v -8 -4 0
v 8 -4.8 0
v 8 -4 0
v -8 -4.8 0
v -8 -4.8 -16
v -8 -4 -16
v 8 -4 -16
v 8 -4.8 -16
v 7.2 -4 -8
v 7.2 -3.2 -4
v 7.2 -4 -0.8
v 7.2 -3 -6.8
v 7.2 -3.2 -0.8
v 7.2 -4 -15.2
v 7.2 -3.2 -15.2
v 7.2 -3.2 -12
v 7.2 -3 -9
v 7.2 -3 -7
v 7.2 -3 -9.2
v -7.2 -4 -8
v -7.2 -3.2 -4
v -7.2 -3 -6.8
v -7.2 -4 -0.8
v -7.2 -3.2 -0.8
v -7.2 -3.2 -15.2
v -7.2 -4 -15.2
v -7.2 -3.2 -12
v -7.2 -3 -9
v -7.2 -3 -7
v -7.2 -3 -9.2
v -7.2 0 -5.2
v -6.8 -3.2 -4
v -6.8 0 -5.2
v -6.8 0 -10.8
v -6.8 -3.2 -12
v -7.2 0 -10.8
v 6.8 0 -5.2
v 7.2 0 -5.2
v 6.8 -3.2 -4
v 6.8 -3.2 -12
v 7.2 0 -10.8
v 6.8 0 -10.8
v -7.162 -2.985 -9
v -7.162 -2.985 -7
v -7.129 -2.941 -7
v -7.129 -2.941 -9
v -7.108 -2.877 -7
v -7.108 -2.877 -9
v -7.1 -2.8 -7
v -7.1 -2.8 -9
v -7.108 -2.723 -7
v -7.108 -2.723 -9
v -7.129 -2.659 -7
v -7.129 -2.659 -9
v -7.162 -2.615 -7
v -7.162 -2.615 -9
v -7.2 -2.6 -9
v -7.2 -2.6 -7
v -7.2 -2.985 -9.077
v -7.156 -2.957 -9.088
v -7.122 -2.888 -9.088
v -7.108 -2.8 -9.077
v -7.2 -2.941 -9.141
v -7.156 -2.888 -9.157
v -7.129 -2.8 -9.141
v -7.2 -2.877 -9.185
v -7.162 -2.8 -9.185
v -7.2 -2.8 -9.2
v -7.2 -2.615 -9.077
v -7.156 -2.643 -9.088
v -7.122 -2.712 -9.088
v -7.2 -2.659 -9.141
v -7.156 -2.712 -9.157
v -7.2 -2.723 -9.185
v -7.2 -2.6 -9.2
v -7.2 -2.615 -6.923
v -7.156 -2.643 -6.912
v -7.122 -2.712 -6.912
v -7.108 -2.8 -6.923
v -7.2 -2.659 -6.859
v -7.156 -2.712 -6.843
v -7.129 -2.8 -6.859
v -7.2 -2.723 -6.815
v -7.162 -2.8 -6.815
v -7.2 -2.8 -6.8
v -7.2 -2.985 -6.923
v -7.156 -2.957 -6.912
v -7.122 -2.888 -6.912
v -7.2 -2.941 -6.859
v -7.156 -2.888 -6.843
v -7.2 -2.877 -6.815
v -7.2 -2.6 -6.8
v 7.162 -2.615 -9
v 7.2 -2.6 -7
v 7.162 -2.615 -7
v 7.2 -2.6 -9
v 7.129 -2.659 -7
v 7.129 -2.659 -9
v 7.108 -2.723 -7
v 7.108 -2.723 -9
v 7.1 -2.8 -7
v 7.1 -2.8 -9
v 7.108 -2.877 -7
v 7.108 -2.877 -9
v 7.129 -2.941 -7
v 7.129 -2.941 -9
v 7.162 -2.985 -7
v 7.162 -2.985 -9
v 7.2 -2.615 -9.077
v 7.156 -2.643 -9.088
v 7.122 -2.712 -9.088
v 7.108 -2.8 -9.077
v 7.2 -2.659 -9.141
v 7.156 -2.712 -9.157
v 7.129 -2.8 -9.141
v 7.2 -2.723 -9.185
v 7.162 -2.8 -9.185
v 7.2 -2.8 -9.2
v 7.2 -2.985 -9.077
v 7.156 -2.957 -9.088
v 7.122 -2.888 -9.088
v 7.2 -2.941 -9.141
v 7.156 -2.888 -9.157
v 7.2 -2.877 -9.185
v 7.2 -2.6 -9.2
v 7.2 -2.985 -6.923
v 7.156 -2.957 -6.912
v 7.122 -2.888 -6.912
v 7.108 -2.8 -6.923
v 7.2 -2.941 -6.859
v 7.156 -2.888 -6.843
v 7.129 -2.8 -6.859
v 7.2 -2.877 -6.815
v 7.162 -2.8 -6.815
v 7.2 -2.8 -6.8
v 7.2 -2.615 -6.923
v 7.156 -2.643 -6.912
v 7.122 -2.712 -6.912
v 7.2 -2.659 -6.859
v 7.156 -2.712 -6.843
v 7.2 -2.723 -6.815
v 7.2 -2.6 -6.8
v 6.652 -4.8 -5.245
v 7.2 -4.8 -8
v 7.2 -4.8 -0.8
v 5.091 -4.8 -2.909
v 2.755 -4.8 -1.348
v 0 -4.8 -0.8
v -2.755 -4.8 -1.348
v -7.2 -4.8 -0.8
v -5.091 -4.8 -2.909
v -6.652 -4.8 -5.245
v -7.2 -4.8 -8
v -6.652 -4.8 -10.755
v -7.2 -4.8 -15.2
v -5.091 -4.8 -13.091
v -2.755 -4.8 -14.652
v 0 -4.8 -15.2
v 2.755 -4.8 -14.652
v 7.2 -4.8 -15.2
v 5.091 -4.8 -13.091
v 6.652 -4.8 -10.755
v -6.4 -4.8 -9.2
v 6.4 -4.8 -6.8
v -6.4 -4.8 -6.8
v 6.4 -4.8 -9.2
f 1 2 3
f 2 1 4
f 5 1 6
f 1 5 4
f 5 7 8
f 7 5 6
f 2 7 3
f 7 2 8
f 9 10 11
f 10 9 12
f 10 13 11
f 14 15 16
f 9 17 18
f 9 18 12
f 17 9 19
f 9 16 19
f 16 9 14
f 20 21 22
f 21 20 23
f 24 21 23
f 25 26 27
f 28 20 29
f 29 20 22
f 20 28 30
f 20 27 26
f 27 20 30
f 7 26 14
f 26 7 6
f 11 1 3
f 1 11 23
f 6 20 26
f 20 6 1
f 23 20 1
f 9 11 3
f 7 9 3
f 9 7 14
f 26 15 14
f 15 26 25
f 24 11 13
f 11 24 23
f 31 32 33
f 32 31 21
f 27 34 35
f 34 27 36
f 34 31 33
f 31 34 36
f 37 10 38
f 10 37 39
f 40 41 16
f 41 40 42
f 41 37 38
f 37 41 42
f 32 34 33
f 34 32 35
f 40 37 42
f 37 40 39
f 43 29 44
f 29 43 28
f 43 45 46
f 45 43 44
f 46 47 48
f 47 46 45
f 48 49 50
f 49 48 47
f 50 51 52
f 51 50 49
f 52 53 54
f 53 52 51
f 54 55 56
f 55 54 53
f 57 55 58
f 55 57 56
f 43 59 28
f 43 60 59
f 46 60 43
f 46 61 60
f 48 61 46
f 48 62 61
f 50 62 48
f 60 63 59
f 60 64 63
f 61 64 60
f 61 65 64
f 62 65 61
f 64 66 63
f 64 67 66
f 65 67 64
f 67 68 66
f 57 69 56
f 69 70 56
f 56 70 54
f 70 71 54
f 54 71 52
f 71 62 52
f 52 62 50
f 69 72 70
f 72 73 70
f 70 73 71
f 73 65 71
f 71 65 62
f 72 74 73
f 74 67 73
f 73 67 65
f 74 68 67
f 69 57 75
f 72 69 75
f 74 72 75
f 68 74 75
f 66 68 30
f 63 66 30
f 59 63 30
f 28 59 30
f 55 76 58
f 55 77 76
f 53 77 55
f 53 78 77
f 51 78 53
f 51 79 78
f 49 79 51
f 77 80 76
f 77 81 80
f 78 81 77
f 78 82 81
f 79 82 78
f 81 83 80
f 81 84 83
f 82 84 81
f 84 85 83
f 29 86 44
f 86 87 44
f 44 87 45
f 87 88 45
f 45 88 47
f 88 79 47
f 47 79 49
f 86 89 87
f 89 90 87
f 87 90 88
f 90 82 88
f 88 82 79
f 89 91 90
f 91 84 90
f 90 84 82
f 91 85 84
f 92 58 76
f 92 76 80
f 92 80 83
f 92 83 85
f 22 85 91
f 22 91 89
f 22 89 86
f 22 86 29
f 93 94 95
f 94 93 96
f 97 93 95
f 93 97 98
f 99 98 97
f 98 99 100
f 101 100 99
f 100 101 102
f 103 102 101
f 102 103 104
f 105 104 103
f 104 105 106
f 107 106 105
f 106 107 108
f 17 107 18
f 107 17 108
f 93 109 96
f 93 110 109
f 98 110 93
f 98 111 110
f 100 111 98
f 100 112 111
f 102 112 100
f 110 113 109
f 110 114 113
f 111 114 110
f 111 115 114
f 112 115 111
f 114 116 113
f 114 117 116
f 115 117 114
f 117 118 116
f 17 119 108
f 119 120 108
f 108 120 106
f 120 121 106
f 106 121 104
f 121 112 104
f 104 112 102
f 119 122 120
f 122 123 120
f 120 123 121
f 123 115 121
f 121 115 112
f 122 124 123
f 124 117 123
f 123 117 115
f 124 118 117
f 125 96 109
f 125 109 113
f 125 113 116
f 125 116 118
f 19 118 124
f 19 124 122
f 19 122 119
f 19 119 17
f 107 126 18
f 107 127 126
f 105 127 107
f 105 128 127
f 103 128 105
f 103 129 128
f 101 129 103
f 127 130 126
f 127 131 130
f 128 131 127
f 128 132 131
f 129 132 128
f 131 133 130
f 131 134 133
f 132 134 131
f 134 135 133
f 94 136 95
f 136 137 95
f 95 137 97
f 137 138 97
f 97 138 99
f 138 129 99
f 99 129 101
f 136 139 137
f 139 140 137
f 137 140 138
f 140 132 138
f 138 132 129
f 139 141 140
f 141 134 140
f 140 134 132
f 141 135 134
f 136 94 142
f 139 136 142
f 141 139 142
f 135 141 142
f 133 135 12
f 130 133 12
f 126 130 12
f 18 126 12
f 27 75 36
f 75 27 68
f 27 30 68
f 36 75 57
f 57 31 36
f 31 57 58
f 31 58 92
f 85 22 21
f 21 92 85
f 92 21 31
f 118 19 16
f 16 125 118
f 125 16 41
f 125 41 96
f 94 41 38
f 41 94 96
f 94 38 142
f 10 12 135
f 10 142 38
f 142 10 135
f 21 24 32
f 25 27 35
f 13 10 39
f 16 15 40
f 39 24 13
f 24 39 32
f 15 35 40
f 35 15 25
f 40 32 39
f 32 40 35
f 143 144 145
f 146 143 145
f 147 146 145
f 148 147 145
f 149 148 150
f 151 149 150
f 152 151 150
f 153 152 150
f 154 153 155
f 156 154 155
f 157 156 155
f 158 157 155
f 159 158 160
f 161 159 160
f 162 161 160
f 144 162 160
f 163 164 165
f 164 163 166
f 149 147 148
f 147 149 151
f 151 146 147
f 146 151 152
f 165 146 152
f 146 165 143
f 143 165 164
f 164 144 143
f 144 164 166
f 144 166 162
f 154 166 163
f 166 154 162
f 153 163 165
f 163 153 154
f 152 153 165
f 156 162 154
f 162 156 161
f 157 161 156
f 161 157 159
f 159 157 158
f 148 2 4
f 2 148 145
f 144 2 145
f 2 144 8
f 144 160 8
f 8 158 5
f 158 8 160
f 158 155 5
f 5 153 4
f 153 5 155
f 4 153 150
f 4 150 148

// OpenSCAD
// file: ../p/1-8sphe.scad
use <../lib.scad>
function ldraw_lib__1_8sphe() = [
// 0 Sphere 0.125
// 0 Name: 1-8sphe.dat
// 0 Author: James Jessiman
// 0 !LDRAW_ORG Primitive UPDATE 2012-03
// 0 !LICENSE Licensed under CC BY 4.0 : see CAreadme.txt
// 
// 0 BFC CERTIFY CCW
  [0,"BFC","CERTIFY"],
  [0,"BFC","CCW"],
// 
// 0 !HISTORY 2000-08-01 {Axel Poque} fixes to resolve L3P error messages.
// 0 !HISTORY 2000-08-01 {Manfred Moolhuysen} fixes to resolve L3P error messages.
// 0 !HISTORY 2000-09-30 [PTadmin] Official Update 2000-02
// 0 !HISTORY 2002-03-28 [hafhead] Made BFC compliant
// 0 !HISTORY 2002-04-25 [PTadmin] Official Update 2002-02
// 0 !HISTORY 2007-06-22 [PTadmin] Header formatted for Contributor Agreement
// 0 !HISTORY 2008-07-01 [PTadmin] Official Update 2008-01
// 0 !HISTORY 2010-09-12 [MagFors] Changed winding, removed duplicated cond-line, optimized filesize
// 0 !HISTORY 2010-12-31 [PTadmin] Official Update 2010-03
// 0 !HISTORY 2012-07-01 [tcobbs] Replaced with geometry from LDView
// 0 !HISTORY 2012-12-28 [PTadmin] Official Update 2012-03
// 
// 
// 3 16 1 0 0 0.9239 0.3827 0 0.9239 0 0.3827
  [3,16,1,0,0,0.9239,0.3827,0,0.9239,0,0.3827],
// 3 16 0.9239 0.3827 0 0.7836 0.4393 0.4393 0.9239 0 0.3827
  [3,16,0.9239,0.3827,0,0.7836,0.4393,0.4393,0.9239,0,0.3827],
// 3 16 0.9239 0 0.3827 0.7836 0.4393 0.4393 0.7071 0 0.7071
  [3,16,0.9239,0,0.3827,0.7836,0.4393,0.4393,0.7071,0,0.7071],
// 3 16 0.7836 0.4393 0.4393 0.4393 0.4393 0.7836 0.7071 0 0.7071
  [3,16,0.7836,0.4393,0.4393,0.4393,0.4393,0.7836,0.7071,0,0.7071],
// 3 16 0.7071 0 0.7071 0.4393 0.4393 0.7836 0.3827 0 0.9239
  [3,16,0.7071,0,0.7071,0.4393,0.4393,0.7836,0.3827,0,0.9239],
// 3 16 0.4393 0.4393 0.7836 0 0.3827 0.9239 0.3827 0 0.9239
  [3,16,0.4393,0.4393,0.7836,0,0.3827,0.9239,0.3827,0,0.9239],
// 3 16 0.3827 0 0.9239 0 0.3827 0.9239 0 0 1
  [3,16,0.3827,0,0.9239,0,0.3827,0.9239,0,0,1],
// 3 16 0.9239 0.3827 0 0.7071 0.7071 0 0.7836 0.4393 0.4393
  [3,16,0.9239,0.3827,0,0.7071,0.7071,0,0.7836,0.4393,0.4393],
// 3 16 0.7071 0.7071 0 0.4393 0.7836 0.4393 0.7836 0.4393 0.4393
  [3,16,0.7071,0.7071,0,0.4393,0.7836,0.4393,0.7836,0.4393,0.4393],
// 3 16 0.7836 0.4393 0.4393 0.4393 0.7836 0.4393 0.4393 0.4393 0.7836
  [3,16,0.7836,0.4393,0.4393,0.4393,0.7836,0.4393,0.4393,0.4393,0.7836],
// 3 16 0.4393 0.7836 0.4393 0 0.7071 0.7071 0.4393 0.4393 0.7836
  [3,16,0.4393,0.7836,0.4393,0,0.7071,0.7071,0.4393,0.4393,0.7836],
// 3 16 0.4393 0.4393 0.7836 0 0.7071 0.7071 0 0.3827 0.9239
  [3,16,0.4393,0.4393,0.7836,0,0.7071,0.7071,0,0.3827,0.9239],
// 3 16 0.7071 0.7071 0 0.3827 0.9239 0 0.4393 0.7836 0.4393
  [3,16,0.7071,0.7071,0,0.3827,0.9239,0,0.4393,0.7836,0.4393],
// 3 16 0.3827 0.9239 0 0 0.9239 0.3827 0.4393 0.7836 0.4393
  [3,16,0.3827,0.9239,0,0,0.9239,0.3827,0.4393,0.7836,0.4393],
// 3 16 0.4393 0.7836 0.4393 0 0.9239 0.3827 0 0.7071 0.7071
  [3,16,0.4393,0.7836,0.4393,0,0.9239,0.3827,0,0.7071,0.7071],
// 3 16 0.3827 0.9239 0 0 1 0 0 0.9239 0.3827
  [3,16,0.3827,0.9239,0,0,1,0,0,0.9239,0.3827],
// 
// 5 24 1 0 0 0.9239 0.3827 0 1 0 -0.1 0.9239 0 0.3827
  [5,24,1,0,0,0.9239,0.3827,0,1,0,-0.1,0.9239,0,0.3827],
// 5 24 0.9239 0.3827 0 0.9239 0 0.3827 1 0 0 0.7836 0.4393 0.4393
  [5,24,0.9239,0.3827,0,0.9239,0,0.3827,1,0,0,0.7836,0.4393,0.4393],
// 5 24 1 0 0 0.9239 0 0.3827 0.9239 0.3827 0 1 -0.1 0
  [5,24,1,0,0,0.9239,0,0.3827,0.9239,0.3827,0,1,-0.1,0],
// 5 24 0.9239 0 0.3827 0.7836 0.4393 0.4393 0.9239 0.3827 0 0.7071 0 0.7071
  [5,24,0.9239,0,0.3827,0.7836,0.4393,0.4393,0.9239,0.3827,0,0.7071,0,0.7071],
// 5 24 0.7836 0.4393 0.4393 0.7071 0 0.7071 0.9239 0 0.3827 0.4393 0.4393 0.7836
  [5,24,0.7836,0.4393,0.4393,0.7071,0,0.7071,0.9239,0,0.3827,0.4393,0.4393,0.7836],
// 5 24 0.9239 0 0.3827 0.7071 0 0.7071 0.7836 0.4393 0.4393 0.9239 -0.1 0.3827
  [5,24,0.9239,0,0.3827,0.7071,0,0.7071,0.7836,0.4393,0.4393,0.9239,-0.1,0.3827],
// 5 24 0.7071 0 0.7071 0.4393 0.4393 0.7836 0.7836 0.4393 0.4393 0.3827 0 0.9239
  [5,24,0.7071,0,0.7071,0.4393,0.4393,0.7836,0.7836,0.4393,0.4393,0.3827,0,0.9239],
// 5 24 0.4393 0.4393 0.7836 0.3827 0 0.9239 0.7071 0 0.7071 0 0.3827 0.9239
  [5,24,0.4393,0.4393,0.7836,0.3827,0,0.9239,0.7071,0,0.7071,0,0.3827,0.9239],
// 5 24 0.7071 0 0.7071 0.3827 0 0.9239 0.4393 0.4393 0.7836 0.7071 -0.1 0.7071
  [5,24,0.7071,0,0.7071,0.3827,0,0.9239,0.4393,0.4393,0.7836,0.7071,-0.1,0.7071],
// 5 24 0.3827 0 0.9239 0 0.3827 0.9239 0.4393 0.4393 0.7836 0 0 1
  [5,24,0.3827,0,0.9239,0,0.3827,0.9239,0.4393,0.4393,0.7836,0,0,1],
// 5 24 0 0.3827 0.9239 0 0 1 0.3827 0 0.9239 -0.1 0.3827 0.9239
  [5,24,0,0.3827,0.9239,0,0,1,0.3827,0,0.9239,-0.1,0.3827,0.9239],
// 5 24 0.3827 0 0.9239 0 0 1 0 0.3827 0.9239 0.3827 -0.1 0.9239
  [5,24,0.3827,0,0.9239,0,0,1,0,0.3827,0.9239,0.3827,-0.1,0.9239],
// 5 24 0.9239 0.3827 0 0.7071 0.7071 0 0.9239 0.3827 -0.1 0.7836 0.4393 0.4393
  [5,24,0.9239,0.3827,0,0.7071,0.7071,0,0.9239,0.3827,-0.1,0.7836,0.4393,0.4393],
// 5 24 0.7071 0.7071 0 0.7836 0.4393 0.4393 0.9239 0.3827 0 0.4393 0.7836 0.4393
  [5,24,0.7071,0.7071,0,0.7836,0.4393,0.4393,0.9239,0.3827,0,0.4393,0.7836,0.4393],
// 5 24 0.9239 0.3827 0 0.7836 0.4393 0.4393 0.7071 0.7071 0 0.9239 0 0.3827
  [5,24,0.9239,0.3827,0,0.7836,0.4393,0.4393,0.7071,0.7071,0,0.9239,0,0.3827],
// 5 24 0.7836 0.4393 0.4393 0.4393 0.7836 0.4393 0.7071 0.7071 0 0.4393 0.4393 0.7836
  [5,24,0.7836,0.4393,0.4393,0.4393,0.7836,0.4393,0.7071,0.7071,0,0.4393,0.4393,0.7836],
// 5 24 0.4393 0.7836 0.4393 0.4393 0.4393 0.7836 0.7836 0.4393 0.4393 0 0.7071 0.7071
  [5,24,0.4393,0.7836,0.4393,0.4393,0.4393,0.7836,0.7836,0.4393,0.4393,0,0.7071,0.7071],
// 5 24 0.7836 0.4393 0.4393 0.4393 0.4393 0.7836 0.4393 0.7836 0.4393 0.7071 0 0.7071
  [5,24,0.7836,0.4393,0.4393,0.4393,0.4393,0.7836,0.4393,0.7836,0.4393,0.7071,0,0.7071],
// 5 24 0.4393 0.4393 0.7836 0 0.7071 0.7071 0.4393 0.7836 0.4393 0 0.3827 0.9239
  [5,24,0.4393,0.4393,0.7836,0,0.7071,0.7071,0.4393,0.7836,0.4393,0,0.3827,0.9239],
// 5 24 0 0.7071 0.7071 0 0.3827 0.9239 0.4393 0.4393 0.7836 -0.1 0.7071 0.7071
  [5,24,0,0.7071,0.7071,0,0.3827,0.9239,0.4393,0.4393,0.7836,-0.1,0.7071,0.7071],
// 5 24 0.4393 0.4393 0.7836 0 0.3827 0.9239 0 0.7071 0.7071 0.3827 0 0.9239
  [5,24,0.4393,0.4393,0.7836,0,0.3827,0.9239,0,0.7071,0.7071,0.3827,0,0.9239],
// 5 24 0.7071 0.7071 0 0.3827 0.9239 0 0.7071 0.7071 -0.1 0.4393 0.7836 0.4393
  [5,24,0.7071,0.7071,0,0.3827,0.9239,0,0.7071,0.7071,-0.1,0.4393,0.7836,0.4393],
// 5 24 0.3827 0.9239 0 0.4393 0.7836 0.4393 0.7071 0.7071 0 0 0.9239 0.3827
  [5,24,0.3827,0.9239,0,0.4393,0.7836,0.4393,0.7071,0.7071,0,0,0.9239,0.3827],
// 5 24 0.7071 0.7071 0 0.4393 0.7836 0.4393 0.3827 0.9239 0 0.7836 0.4393 0.4393
  [5,24,0.7071,0.7071,0,0.4393,0.7836,0.4393,0.3827,0.9239,0,0.7836,0.4393,0.4393],
// 5 24 0.4393 0.7836 0.4393 0 0.9239 0.3827 0.3827 0.9239 0 0 0.7071 0.7071
  [5,24,0.4393,0.7836,0.4393,0,0.9239,0.3827,0.3827,0.9239,0,0,0.7071,0.7071],
// 5 24 0 0.9239 0.3827 0 0.7071 0.7071 0.4393 0.7836 0.4393 -0.1 0.9239 0.3827
  [5,24,0,0.9239,0.3827,0,0.7071,0.7071,0.4393,0.7836,0.4393,-0.1,0.9239,0.3827],
// 5 24 0.4393 0.7836 0.4393 0 0.7071 0.7071 0 0.9239 0.3827 0.4393 0.4393 0.7836
  [5,24,0.4393,0.7836,0.4393,0,0.7071,0.7071,0,0.9239,0.3827,0.4393,0.4393,0.7836],
// 5 24 0.3827 0.9239 0 0 1 0 0.3827 0.9239 -0.1 0 0.9239 0.3827
  [5,24,0.3827,0.9239,0,0,1,0,0.3827,0.9239,-0.1,0,0.9239,0.3827],
// 5 24 0 1 0 0 0.9239 0.3827 0.3827 0.9239 0 -0.1 1 0
  [5,24,0,1,0,0,0.9239,0.3827,0.3827,0.9239,0,-0.1,1,0],
// 5 24 0.3827 0.9239 0 0 0.9239 0.3827 0 1 0 0.4393 0.7836 0.4393
  [5,24,0.3827,0.9239,0,0,0.9239,0.3827,0,1,0,0.4393,0.7836,0.4393],
];
module ldraw_lib__1_8sphe(step=0, col=false, unit=2/5, alt=false, line=0.2, solid=!$preview)
    makepoly(ldraw_lib__1_8sphe(), step=step, col=col, unit=unit, alt=alt, line=line, solid=solid);
ldraw_lib__1_8sphe(line=0.2);
// file: ../p/empty.scad
use <../lib.scad>
function ldraw_lib__empty() = [
// 0 Empty
// 0 Name: empty.dat
// 0 Author: Steffen [Steffen]
// 0 !LDRAW_ORG Primitive UPDATE 2015-01
// 0 !LICENSE Licensed under CC BY 4.0 : see CAreadme.txt
// 
// 0 BFC CERTIFY CCW
  [0,"BFC","CERTIFY"],
  [0,"BFC","CCW"],
// 
// 0 !HISTORY 2015-10-11 [PTadmin] Official Update 2015-01
// 
// 
// 0 // // Tool MLCad cannot handle really empty files. This file is used as a workaround.
// 0 // // It exceptionally contains forbidden non-LDRAW standard syntax to satisfy MLCad until it is fixed OR a different editor has become the de-facto LDRAW standard.
// 0 // // The line being used here is an "impossible" conditional line which never should be visible,
// 0 // // additionally hidden by a syntax explicitly hiding it from displaying.
// 
// 0 // MLCAD HIDE 5 24 0 0 0 0.0001 0 0 0.0001 -0.0001 0 0 0 0
];
module ldraw_lib__empty(step=0, col=false, unit=2/5, alt=false, line=0.2, solid=!$preview)
    makepoly(ldraw_lib__empty(), step=step, col=col, unit=unit, alt=alt, line=line, solid=solid);
ldraw_lib__empty(line=0.2);
// file: ../p/box4.scad
use <../lib.scad>
function ldraw_lib__box4() = [
// 0 Box with 4 Faces (2 Parallel Pairs) and All Edges
// 0 Name: box4.dat
// 0 Author: James Jessiman
// 0 !LDRAW_ORG Primitive UPDATE 2012-01
// 0 !LICENSE Licensed under CC BY 4.0 : see CAreadme.txt
// 
// 0 BFC CERTIFY CCW
  [0,"BFC","CERTIFY"],
  [0,"BFC","CCW"],
// 
// 0 !HISTORY 2002-04-03 [sbliss] Modified for BFC compliance
// 0 !HISTORY 2002-04-25 [PTadmin] Official Update 2002-02
// 0 !HISTORY 2007-06-24 [PTadmin] Header formatted for Contributor Agreement
// 0 !HISTORY 2008-07-01 [PTadmin] Official Update 2008-01
// 0 !HISTORY 2012-02-16 [Philo] Changed to CCW
// 0 !HISTORY 2012-03-30 [PTadmin] Official Update 2012-01
// 
// 
// 2 24 1 1 1 -1 1 1
  [2,24,1,1,1,-1,1,1],
// 2 24 -1 1 1 -1 1 -1
  [2,24,-1,1,1,-1,1,-1],
// 2 24 -1 1 -1 1 1 -1
  [2,24,-1,1,-1,1,1,-1],
// 2 24 1 1 -1 1 1 1
  [2,24,1,1,-1,1,1,1],
// 2 24 1 0 1 -1 0 1
  [2,24,1,0,1,-1,0,1],
// 2 24 -1 0 1 -1 0 -1
  [2,24,-1,0,1,-1,0,-1],
// 2 24 -1 0 -1 1 0 -1
  [2,24,-1,0,-1,1,0,-1],
// 2 24 1 0 -1 1 0 1
  [2,24,1,0,-1,1,0,1],
// 2 24 1 0 1 1 1 1
  [2,24,1,0,1,1,1,1],
// 2 24 -1 0 1 -1 1 1
  [2,24,-1,0,1,-1,1,1],
// 2 24 1 0 -1 1 1 -1
  [2,24,1,0,-1,1,1,-1],
// 2 24 -1 0 -1 -1 1 -1
  [2,24,-1,0,-1,-1,1,-1],
// 4 16 -1 1 1 -1 0 1 1 0 1 1 1 1
  [4,16,-1,1,1,-1,0,1,1,0,1,1,1,1],
// 4 16 -1 1 -1 -1 0 -1 -1 0 1 -1 1 1
  [4,16,-1,1,-1,-1,0,-1,-1,0,1,-1,1,1],
// 4 16 1 1 -1 1 0 -1 -1 0 -1 -1 1 -1
  [4,16,1,1,-1,1,0,-1,-1,0,-1,-1,1,-1],
// 4 16 1 1 1 1 0 1 1 0 -1 1 1 -1
  [4,16,1,1,1,1,0,1,1,0,-1,1,1,-1],
];
module ldraw_lib__box4(step=0, col=false, unit=2/5, alt=false, line=0.2, solid=!$preview)
    makepoly(ldraw_lib__box4(), step=step, col=col, unit=unit, alt=alt, line=line, solid=solid);
ldraw_lib__box4(line=0.2);
// file: ../p/2-8sphe.scad
use <../lib.scad>
use <1-8sphe.scad>
function ldraw_lib__2_8sphe() = [
// 0 Sphere 0.25
// 0 Name: 2-8sphe.dat
// 0 Author: James Jessiman
// 0 !LDRAW_ORG Primitive UPDATE 2003-02
// 0 !LICENSE Licensed under CC BY 4.0 : see CAreadme.txt
// 
// 0 BFC CERTIFY CCW
  [0,"BFC","CERTIFY"],
  [0,"BFC","CCW"],
// 
// 0 !HISTORY 2002-08-31 [izanette] Modified with WINDZ for BFC compliance
// 0 !HISTORY 2003-08-01 [PTadmin] Official Update 2003-02
// 0 !HISTORY 2007-06-24 [PTadmin] Header formatted for Contributor Agreement
// 0 !HISTORY 2008-07-01 [PTadmin] Official Update 2008-01
// 
// 
// 1 16 0 0 0 1 0 0 0 1 0 0 0 1 1-8sphe.dat
  [1,16,0,0,0,1,0,0,0,1,0,0,0,1, ldraw_lib__1_8sphe()],
// 1 16 0 0 0 -1 0 0 0 1 0 0 0 1 1-8sphe.dat
  [1,16,0,0,0,-1,0,0,0,1,0,0,0,1, ldraw_lib__1_8sphe()],
// 0
// 
];
module ldraw_lib__2_8sphe(step=0, col=false, unit=2/5, alt=false, line=0.2, solid=!$preview)
    makepoly(ldraw_lib__2_8sphe(), step=step, col=col, unit=unit, alt=alt, line=line, solid=solid);
ldraw_lib__2_8sphe(line=0.2);
// file: ../p/2-4ndis.scad
use <../lib.scad>
function ldraw_lib__2_4ndis() = [
// 0 Disc Negative 0.5
// 0 Name: 2-4ndis.dat
// 0 Author: James Jessiman
// 0 !LDRAW_ORG Primitive UPDATE 2012-01
// 0 !LICENSE Licensed under CC BY 4.0 : see CAreadme.txt
// 
// 0 BFC CERTIFY CCW
  [0,"BFC","CERTIFY"],
  [0,"BFC","CCW"],
// 
// 0 !HISTORY 2002-03-23 [sbliss] Added BFC statement; compacted code
// 0 !HISTORY 2002-04-25 [PTadmin] Official Update 2002-02
// 0 !HISTORY 2007-06-24 [PTadmin] Header formatted for Contributor Agreement
// 0 !HISTORY 2008-07-01 [PTadmin] Official Update 2008-01
// 0 !HISTORY 2012-02-16 [Philo] Changed to CCW
// 0 !HISTORY 2012-03-30 [PTadmin] Official Update 2012-01
// 
// 
// 3 16 0.9239 0 0.3827 1 0 0 1 0 1
  [3,16,0.9239,0,0.3827,1,0,0,1,0,1],
// 3 16 0.7071 0 0.7071 0.9239 0 0.3827 1 0 1
  [3,16,0.7071,0,0.7071,0.9239,0,0.3827,1,0,1],
// 3 16 0.3827 0 0.9239 0.7071 0 0.7071 1 0 1
  [3,16,0.3827,0,0.9239,0.7071,0,0.7071,1,0,1],
// 3 16 0 0 1 0.3827 0 0.9239 1 0 1
  [3,16,0,0,1,0.3827,0,0.9239,1,0,1],
// 3 16 -0.3827 0 0.9239 0 0 1 -1 0 1
  [3,16,-0.3827,0,0.9239,0,0,1,-1,0,1],
// 3 16 -0.7071 0 0.7071 -0.3827 0 0.9239 -1 0 1
  [3,16,-0.7071,0,0.7071,-0.3827,0,0.9239,-1,0,1],
// 3 16 -0.9239 0 0.3827 -0.7071 0 0.7071 -1 0 1
  [3,16,-0.9239,0,0.3827,-0.7071,0,0.7071,-1,0,1],
// 3 16 -1 0 0 -0.9239 0 0.3827 -1 0 1
  [3,16,-1,0,0,-0.9239,0,0.3827,-1,0,1],
];
module ldraw_lib__2_4ndis(step=0, col=false, unit=2/5, alt=false, line=0.2, solid=!$preview)
    makepoly(ldraw_lib__2_4ndis(), step=step, col=col, unit=unit, alt=alt, line=line, solid=solid);
ldraw_lib__2_4ndis(line=0.2);
// file: ../p/2-4edge.scad
use <../lib.scad>
function ldraw_lib__2_4edge() = [
// 0 Circle 0.5
// 0 Name: 2-4edge.dat
// 0 Author: James Jessiman
// 0 !LDRAW_ORG Primitive UPDATE 2017-01
// 0 !LICENSE Licensed under CC BY 4.0 : see CAreadme.txt
// 
// 0 BFC CERTIFY CCW
  [0,"BFC","CERTIFY"],
  [0,"BFC","CCW"],
// 
// 0 !HISTORY 2007-06-24 [PTadmin] Header formatted for Contributor Agreement
// 0 !HISTORY 2008-07-01 [PTadmin] Official Update 2008-01
// 0 !HISTORY 2017-01-15 [Steffen] BFCed
// 0 !HISTORY 2017-12-30 [PTadmin] Official Update 2017-01
// 
// 
// 2 24 1 0 0 0.9239 0 0.3827
  [2,24,1,0,0,0.9239,0,0.3827],
// 2 24 0.9239 0 0.3827 0.7071 0 0.7071
  [2,24,0.9239,0,0.3827,0.7071,0,0.7071],
// 2 24 0.7071 0 0.7071 0.3827 0 0.9239
  [2,24,0.7071,0,0.7071,0.3827,0,0.9239],
// 2 24 0.3827 0 0.9239 0 0 1
  [2,24,0.3827,0,0.9239,0,0,1],
// 2 24 0 0 1 -0.3827 0 0.9239
  [2,24,0,0,1,-0.3827,0,0.9239],
// 2 24 -0.3827 0 0.9239 -0.7071 0 0.7071
  [2,24,-0.3827,0,0.9239,-0.7071,0,0.7071],
// 2 24 -0.7071 0 0.7071 -0.9239 0 0.3827
  [2,24,-0.7071,0,0.7071,-0.9239,0,0.3827],
// 2 24 -0.9239 0 0.3827 -1 0 0
  [2,24,-0.9239,0,0.3827,-1,0,0],
];
module ldraw_lib__2_4edge(step=0, col=false, unit=2/5, alt=false, line=0.2, solid=!$preview)
    makepoly(ldraw_lib__2_4edge(), step=step, col=col, unit=unit, alt=alt, line=line, solid=solid);
ldraw_lib__2_4edge(line=0.2);
// file: ../p/2-4cyli.scad
use <../lib.scad>
function ldraw_lib__2_4cyli() = [
// 0 Cylinder 0.5
// 0 Name: 2-4cyli.dat
// 0 Author: James Jessiman
// 0 !LDRAW_ORG Primitive UPDATE 2005-01
// 0 !LICENSE Licensed under CC BY 4.0 : see CAreadme.txt
// 
// 0 BFC CERTIFY CCW
  [0,"BFC","CERTIFY"],
  [0,"BFC","CCW"],
// 
// 0 !HISTORY 2002-03-23 [sbliss] Added BFC statement; compacted code
// 0 !HISTORY 2002-04-25 [PTadmin] Official Update 2002-02
// 0 !HISTORY 2004-12-11 [nielsk] Recreated using Primitive Generator, Edge lines fixed, BFC changed to CCW
// 0 !HISTORY 2005-12-28 [PTadmin] Official Update 2005-01
// 0 !HISTORY 2007-06-24 [PTadmin] Header formatted for Contributor Agreement
// 0 !HISTORY 2008-07-01 [PTadmin] Official Update 2008-01
// 
// 
// 4 16 .9239 1 .3827 .9239 0 .3827 1 0 0 1 1 0
  [4,16,.9239,1,.3827,.9239,0,.3827,1,0,0,1,1,0],
// 4 16 .7071 1 .7071 .7071 0 .7071 .9239 0 .3827 .9239 1 .3827
  [4,16,.7071,1,.7071,.7071,0,.7071,.9239,0,.3827,.9239,1,.3827],
// 4 16 .3827 1 .9239 .3827 0 .9239 .7071 0 .7071 .7071 1 .7071
  [4,16,.3827,1,.9239,.3827,0,.9239,.7071,0,.7071,.7071,1,.7071],
// 4 16 0 1 1 0 0 1 .3827 0 .9239 .3827 1 .9239
  [4,16,0,1,1,0,0,1,.3827,0,.9239,.3827,1,.9239],
// 4 16 -.3827 1 .9239 -.3827 0 .9239 0 0 1 0 1 1
  [4,16,-.3827,1,.9239,-.3827,0,.9239,0,0,1,0,1,1],
// 4 16 -.7071 1 .7071 -.7071 0 .7071 -.3827 0 .9239 -.3827 1 .9239
  [4,16,-.7071,1,.7071,-.7071,0,.7071,-.3827,0,.9239,-.3827,1,.9239],
// 4 16 -.9239 1 .3827 -.9239 0 .3827 -.7071 0 .7071 -.7071 1 .7071
  [4,16,-.9239,1,.3827,-.9239,0,.3827,-.7071,0,.7071,-.7071,1,.7071],
// 4 16 -1 1 0 -1 0 0 -.9239 0 .3827 -.9239 1 .3827
  [4,16,-1,1,0,-1,0,0,-.9239,0,.3827,-.9239,1,.3827],
// 5 24 1 1 0 1 0 0 1 1 -.4142 .9239 1 .3827
  [5,24,1,1,0,1,0,0,1,1,-.4142,.9239,1,.3827],
// 5 24 .9239 1 .3827 .9239 0 .3827 1 1 0 .7071 1 .7071
  [5,24,.9239,1,.3827,.9239,0,.3827,1,1,0,.7071,1,.7071],
// 5 24 .7071 1 .7071 .7071 0 .7071 .9239 1 .3827 .3827 1 .9239
  [5,24,.7071,1,.7071,.7071,0,.7071,.9239,1,.3827,.3827,1,.9239],
// 5 24 .3827 1 .9239 .3827 0 .9239 .7071 1 .7071 0 1 1
  [5,24,.3827,1,.9239,.3827,0,.9239,.7071,1,.7071,0,1,1],
// 5 24 0 1 1 0 0 1 .3827 1 .9239 -.3827 1 .9239
  [5,24,0,1,1,0,0,1,.3827,1,.9239,-.3827,1,.9239],
// 5 24 -.3827 1 .9239 -.3827 0 .9239 0 1 1 -.7071 1 .7071
  [5,24,-.3827,1,.9239,-.3827,0,.9239,0,1,1,-.7071,1,.7071],
// 5 24 -.7071 1 .7071 -.7071 0 .7071 -.3827 1 .9239 -.9239 1 .3827
  [5,24,-.7071,1,.7071,-.7071,0,.7071,-.3827,1,.9239,-.9239,1,.3827],
// 5 24 -.9239 1 .3827 -.9239 0 .3827 -.7071 1 .7071 -1 1 0
  [5,24,-.9239,1,.3827,-.9239,0,.3827,-.7071,1,.7071,-1,1,0],
// 5 24 -1 1 0 -1 0 0 -.9239 1 .3827 -1 1 -.4142
  [5,24,-1,1,0,-1,0,0,-.9239,1,.3827,-1,1,-.4142],
// 0
];
module ldraw_lib__2_4cyli(step=0, col=false, unit=2/5, alt=false, line=0.2, solid=!$preview)
    makepoly(ldraw_lib__2_4cyli(), step=step, col=col, unit=unit, alt=alt, line=line, solid=solid);
ldraw_lib__2_4cyli(line=0.2);
// file: ../p/1-16chrd.scad
use <../lib.scad>
use <empty.scad>
function ldraw_lib__1_16chrd() = [
// 0 Chord 0.0625
// 0 Name: 1-16chrd.dat
// 0 Author: Philippe Hurbain [Philo]
// 0 !LDRAW_ORG Primitive UPDATE 2015-01
// 0 !LICENSE Licensed under CC BY 4.0 : see CAreadme.txt
// 
// 0 BFC CERTIFY CCW
  [0,"BFC","CERTIFY"],
  [0,"BFC","CCW"],
// 
// 0 !HISTORY 2015-10-11 [PTadmin] Official Update 2015-01
// 
// 
// 0 // This file is intentionally empty because at the current \P resolution,
// 0 // an 1-16chrd is actually empty. However, this file still is present
// 0 // to allow tools to do primitives substition and fill in a real chrd here,
// 0 // or, if desired, to substitute this with the hi-res 48\1-16chrd.
// 
// 0 // This file is based on an idea by Darats at http://forums.ldraw.org/read.php?19,14500,14500#msg-14500
// 
// 1 16 0 0 0 1 0 0 0 1 0 0 0 1 empty.dat
  [1,16,0,0,0,1,0,0,0,1,0,0,0,1, ldraw_lib__empty()],
];
module ldraw_lib__1_16chrd(step=0, col=false, unit=2/5, alt=false, line=0.2, solid=!$preview)
    makepoly(ldraw_lib__1_16chrd(), step=step, col=col, unit=unit, alt=alt, line=line, solid=solid);
ldraw_lib__1_16chrd(line=0.2);
// file: ../p/4-4ndis.scad
use <../lib.scad>
function ldraw_lib__4_4ndis() = [
// 0 Disc Negative 1.0
// 0 Name: 4-4ndis.dat
// 0 Author: James Jessiman
// 0 !LDRAW_ORG Primitive UPDATE 2012-01
// 0 !LICENSE Licensed under CC BY 4.0 : see CAreadme.txt
// 
// 0 BFC CERTIFY CCW
  [0,"BFC","CERTIFY"],
  [0,"BFC","CCW"],
// 
// 0 !HISTORY 2002-03-23 [sbliss] Added BFC statement; compacted code
// 0 !HISTORY 2002-04-25 [PTadmin] Official Update 2002-02
// 0 !HISTORY 2007-06-24 [PTadmin] Header formatted for Contributor Agreement
// 0 !HISTORY 2008-07-01 [PTadmin] Official Update 2008-01
// 0 !HISTORY 2012-02-16 [Philo] Changed to CCW
// 0 !HISTORY 2012-03-30 [PTadmin] Official Update 2012-01
// 
// 
// 3 16 0.9239 0 0.3827 1 0 0 1 0 1
  [3,16,0.9239,0,0.3827,1,0,0,1,0,1],
// 3 16 0.7071 0 0.7071 0.9239 0 0.3827 1 0 1
  [3,16,0.7071,0,0.7071,0.9239,0,0.3827,1,0,1],
// 3 16 0.3827 0 0.9239 0.7071 0 0.7071 1 0 1
  [3,16,0.3827,0,0.9239,0.7071,0,0.7071,1,0,1],
// 3 16 0 0 1 0.3827 0 0.9239 1 0 1
  [3,16,0,0,1,0.3827,0,0.9239,1,0,1],
// 3 16 -0.3827 0 0.9239 0 0 1 -1 0 1
  [3,16,-0.3827,0,0.9239,0,0,1,-1,0,1],
// 3 16 -0.7071 0 0.7071 -0.3827 0 0.9239 -1 0 1
  [3,16,-0.7071,0,0.7071,-0.3827,0,0.9239,-1,0,1],
// 3 16 -0.9239 0 0.3827 -0.7071 0 0.7071 -1 0 1
  [3,16,-0.9239,0,0.3827,-0.7071,0,0.7071,-1,0,1],
// 3 16 -1 0 0 -0.9239 0 0.3827 -1 0 1
  [3,16,-1,0,0,-0.9239,0,0.3827,-1,0,1],
// 3 16 -0.9239 0 -0.3827 -1 0 0 -1 0 -1
  [3,16,-0.9239,0,-0.3827,-1,0,0,-1,0,-1],
// 3 16 -0.7071 0 -0.7071 -0.9239 0 -0.3827 -1 0 -1
  [3,16,-0.7071,0,-0.7071,-0.9239,0,-0.3827,-1,0,-1],
// 3 16 -0.3827 0 -0.9239 -0.7071 0 -0.7071 -1 0 -1
  [3,16,-0.3827,0,-0.9239,-0.7071,0,-0.7071,-1,0,-1],
// 3 16 0 0 -1 -0.3827 0 -0.9239 -1 0 -1
  [3,16,0,0,-1,-0.3827,0,-0.9239,-1,0,-1],
// 3 16 0.3827 0 -0.9239 0 0 -1 1 0 -1
  [3,16,0.3827,0,-0.9239,0,0,-1,1,0,-1],
// 3 16 0.7071 0 -0.7071 0.3827 0 -0.9239 1 0 -1
  [3,16,0.7071,0,-0.7071,0.3827,0,-0.9239,1,0,-1],
// 3 16 0.9239 0 -0.3827 0.7071 0 -0.7071 1 0 -1
  [3,16,0.9239,0,-0.3827,0.7071,0,-0.7071,1,0,-1],
// 3 16 1 0 0 0.9239 0 -0.3827 1 0 -1
  [3,16,1,0,0,0.9239,0,-0.3827,1,0,-1],
];
module ldraw_lib__4_4ndis(step=0, col=false, unit=2/5, alt=false, line=0.2, solid=!$preview)
    makepoly(ldraw_lib__4_4ndis(), step=step, col=col, unit=unit, alt=alt, line=line, solid=solid);
ldraw_lib__4_4ndis(line=0.2);
// file: ../p/4-4ering.scad
use <../lib.scad>
use <1-16chrd.scad>
function ldraw_lib__4_4ering() = [
// 0 Adapter Ring Triangles to Normal 1.0
// 0 Name: 4-4ering.dat
// 0 Author: Philippe Hurbain [Philo]
// 0 !LDRAW_ORG Primitive UPDATE 2015-01
// 0 !LICENSE Licensed under CC BY 4.0 : see CAreadme.txt
// 
// 0 BFC CERTIFY CCW
  [0,"BFC","CERTIFY"],
  [0,"BFC","CCW"],
// 
// 0 !HISTORY 2015-10-11 [PTadmin] Official Update 2015-01
// 
// 
// 0 // This file uses 1-16chrd (actually empty). It allows
// 0 // tools to do primitives substition and fill in a ring of chrd here,
// 0 // or, if desired, to substitute this with the hi-res 48\1-16chrd.
// 0 // This file is based on an idea by Darats at http://forums.ldraw.org/read.php?19,14500,14500#msg-14500
// 
// 1 16 0 0 0 1 0 0 0 1 0 0 0 1 1-16chrd.dat
  [1,16,0,0,0,1,0,0,0,1,0,0,0,1, ldraw_lib__1_16chrd()],
// 1 16 0 0 0 0.92388 0 0.38268 0 1 0 -0.38268 0 0.92388 1-16chrd.dat
  [1,16,0,0,0,0.92388,0,0.38268,0,1,0,-0.38268,0,0.92388, ldraw_lib__1_16chrd()],
// 1 16 0 0 0 0.70711 0 0.70711 0 1 0 -0.70711 0 0.70711 1-16chrd.dat
  [1,16,0,0,0,0.70711,0,0.70711,0,1,0,-0.70711,0,0.70711, ldraw_lib__1_16chrd()],
// 1 16 0 0 0 0.38268 0 0.92388 0 1 0 -0.92388 0 0.38268 1-16chrd.dat
  [1,16,0,0,0,0.38268,0,0.92388,0,1,0,-0.92388,0,0.38268, ldraw_lib__1_16chrd()],
// 1 16 0 0 0 0 0 1 0 1 0 -1 0 0 1-16chrd.dat
  [1,16,0,0,0,0,0,1,0,1,0,-1,0,0, ldraw_lib__1_16chrd()],
// 1 16 0 0 0 -0.38268 0 0.92388 0 1 0 -0.92388 0 -0.38268 1-16chrd.dat
  [1,16,0,0,0,-0.38268,0,0.92388,0,1,0,-0.92388,0,-0.38268, ldraw_lib__1_16chrd()],
// 1 16 0 0 0 -0.70711 0 0.70711 0 1 0 -0.70711 0 -0.70711 1-16chrd.dat
  [1,16,0,0,0,-0.70711,0,0.70711,0,1,0,-0.70711,0,-0.70711, ldraw_lib__1_16chrd()],
// 1 16 0 0 0 -0.92388 0 0.38268 0 1 0 -0.38268 0 -0.92388 1-16chrd.dat
  [1,16,0,0,0,-0.92388,0,0.38268,0,1,0,-0.38268,0,-0.92388, ldraw_lib__1_16chrd()],
// 1 16 0 0 0 0 0 -1 0 1 0 1 0 0 1-16chrd.dat
  [1,16,0,0,0,0,0,-1,0,1,0,1,0,0, ldraw_lib__1_16chrd()],
// 1 16 0 0 0 0.38268 0 -0.92388 0 1 0 0.92388 0 0.38268 1-16chrd.dat
  [1,16,0,0,0,0.38268,0,-0.92388,0,1,0,0.92388,0,0.38268, ldraw_lib__1_16chrd()],
// 1 16 0 0 0 0.70711 0 -0.70711 0 1 0 0.70711 0 0.70711 1-16chrd.dat
  [1,16,0,0,0,0.70711,0,-0.70711,0,1,0,0.70711,0,0.70711, ldraw_lib__1_16chrd()],
// 1 16 0 0 0 0.92388 0 -0.38268 0 1 0 0.38268 0 0.92388 1-16chrd.dat
  [1,16,0,0,0,0.92388,0,-0.38268,0,1,0,0.38268,0,0.92388, ldraw_lib__1_16chrd()],
// 1 16 0 0 0 -1 0 0 0 1 0 0 0 -1 1-16chrd.dat
  [1,16,0,0,0,-1,0,0,0,1,0,0,0,-1, ldraw_lib__1_16chrd()],
// 1 16 0 0 0 -0.92388 0 -0.38268 0 1 0 0.38268 0 -0.92388 1-16chrd.dat
  [1,16,0,0,0,-0.92388,0,-0.38268,0,1,0,0.38268,0,-0.92388, ldraw_lib__1_16chrd()],
// 1 16 0 0 0 -0.70711 0 -0.70711 0 1 0 0.70711 0 -0.70711 1-16chrd.dat
  [1,16,0,0,0,-0.70711,0,-0.70711,0,1,0,0.70711,0,-0.70711, ldraw_lib__1_16chrd()],
// 1 16 0 0 0 -0.38268 0 -0.92388 0 1 0 0.92388 0 -0.38268 1-16chrd.dat
  [1,16,0,0,0,-0.38268,0,-0.92388,0,1,0,0.92388,0,-0.38268, ldraw_lib__1_16chrd()],
];
module ldraw_lib__4_4ering(step=0, col=false, unit=2/5, alt=false, line=0.2, solid=!$preview)
    makepoly(ldraw_lib__4_4ering(), step=step, col=col, unit=unit, alt=alt, line=line, solid=solid);
ldraw_lib__4_4ering(line=0.2);
// main file
use <../lib.scad>
use <../p/4-4ering.scad>
use <../p/4-4ndis.scad>
use <s/2384s01.scad>
function ldraw_lib__2384p05() = [
// 0 ~Electric Light & Sound Clip-On Plate  2 x  2 with No Entry Pattern
// 0 Name: 2384p05.dat
// 0 Author: Takeshi Takahashi [RainbowDolphin]
// 0 !LDRAW_ORG Part UPDATE 2025-07
// 0 !LICENSE Licensed under CC BY 4.0 : see CAreadme.txt
// 
// 0 BFC CERTIFY CCW
  [0,"BFC","CERTIFY"],
  [0,"BFC","CCW"],
// 
// 0 !KEYWORDS Bricklink 2384pb05, Brickowl 100118, No thoroughfare
// 0 !KEYWORDS Rebrickable 2384pr0005, Roadsign, Set 5030, Set 846
// 
// 0 !HISTORY 2023-06-24 [OrionP] Official Update 2023-03
// 0 !HISTORY 2025-07-27 [OrionP] Minor header edits
// 0 !HISTORY 2025-07-27 [OrionP] Official Update 2025-07
// 
// 
// 1 16 0 0 0 1 0 0 0 1 0 0 0 1 s\2384s01.dat
  [1,16,0,0,0,1,0,0,0,1,0,0,0,1, ldraw_lib__s__2384s01()],
// 1 16 0 20 -12 18 0 0 0 0 -18 0 1 0 4-4ndis.dat
  [1,16,0,20,-12,18,0,0,0,0,-18,0,1,0, ldraw_lib__4_4ndis()],
// 1 4 0 20 -12 18 0 0 0 0 -18 0 1 0 4-4ering.dat
  [1,4,0,20,-12,18,0,0,0,0,-18,0,1,0, ldraw_lib__4_4ering()],
// 4 16 16 17 -12 -16 17 -12 -16 23 -12 16 23 -12
  [4,16,16,17,-12,-16,17,-12,-16,23,-12,16,23,-12],
// 4 4 6.8886 3.3698 -12 0 2 -12 -6.8886 3.3698 -12 -12.7278 7.2722 -12
  [4,4,6.8886,3.3698,-12,0,2,-12,-6.8886,3.3698,-12,-12.7278,7.2722,-12],
// 4 4 12.7278 7.2722 -12 6.8886 3.3698 -12 -12.7278 7.2722 -12 -16.6302 13.1114 -12
  [4,4,12.7278,7.2722,-12,6.8886,3.3698,-12,-12.7278,7.2722,-12,-16.6302,13.1114,-12],
// 4 4 16.6302 13.1114 -12 12.7278 7.2722 -12 -16.6302 13.1114 -12 -16 17 -12
  [4,4,16.6302,13.1114,-12,12.7278,7.2722,-12,-16.6302,13.1114,-12,-16,17,-12],
// 3 4 16.6302 13.1114 -12 -16 17 -12 16 17 -12
  [3,4,16.6302,13.1114,-12,-16,17,-12,16,17,-12],
// 4 4 18 20 -12 16.6302 13.1114 -12 16 17 -12 16 23 -12
  [4,4,18,20,-12,16.6302,13.1114,-12,16,17,-12,16,23,-12],
// 3 4 18 20 -12 16 23 -12 16.6302 26.8886 -12
  [3,4,18,20,-12,16,23,-12,16.6302,26.8886,-12],
// 4 4 16.6302 26.8886 -12 16 23 -12 -16 23 -12 -16.6302 26.8886 -12
  [4,4,16.6302,26.8886,-12,16,23,-12,-16,23,-12,-16.6302,26.8886,-12],
// 4 4 -18 20 -12 -16.6302 26.8886 -12 -16 23 -12 -16 17 -12
  [4,4,-18,20,-12,-16.6302,26.8886,-12,-16,23,-12,-16,17,-12],
// 3 4 -16.6302 13.1114 -12 -18 20 -12 -16 17 -12
  [3,4,-16.6302,13.1114,-12,-18,20,-12,-16,17,-12],
// 4 4 16.6302 26.8886 -12 -16.6302 26.8886 -12 -12.7278 32.7278 -12 12.7278 32.7278 -12
  [4,4,16.6302,26.8886,-12,-16.6302,26.8886,-12,-12.7278,32.7278,-12,12.7278,32.7278,-12],
// 4 4 12.7278 32.7278 -12 -12.7278 32.7278 -12 -6.8886 36.6302 -12 6.8886 36.6302 -12
  [4,4,12.7278,32.7278,-12,-12.7278,32.7278,-12,-6.8886,36.6302,-12,6.8886,36.6302,-12],
// 3 4 6.8886 36.6302 -12 -6.8886 36.6302 -12 0 38 -12
  [3,4,6.8886,36.6302,-12,-6.8886,36.6302,-12,0,38,-12],
// 4 16 20 0 -12 -20 0 -12 0 2 -12 18 2 -12
  [4,16,20,0,-12,-20,0,-12,0,2,-12,18,2,-12],
// 4 16 20 0 -12 18 2 -12 18 20 -12 20 40 -12
  [4,16,20,0,-12,18,2,-12,18,20,-12,20,40,-12],
// 3 16 18 20 -12 18 38 -12 20 40 -12
  [3,16,18,20,-12,18,38,-12,20,40,-12],
// 4 16 20 40 -12 18 38 -12 0 38 -12 -20 40 -12
  [4,16,20,40,-12,18,38,-12,0,38,-12,-20,40,-12],
// 3 16 0 38 -12 -18 38 -12 -20 40 -12
  [3,16,0,38,-12,-18,38,-12,-20,40,-12],
// 4 16 -20 40 -12 -18 38 -12 -18 20 -12 -20 0 -12
  [4,16,-20,40,-12,-18,38,-12,-18,20,-12,-20,0,-12],
// 3 16 -20 0 -12 -18 20 -12 -18 2 -12
  [3,16,-20,0,-12,-18,20,-12,-18,2,-12],
// 3 16 -20 0 -12 -18 2 -12 0 2 -12
  [3,16,-20,0,-12,-18,2,-12,0,2,-12],
];
module ldraw_lib__2384p05(step=0, col=false, unit=2/5, alt=false, line=0.2, solid=!$preview)
    makepoly(ldraw_lib__2384p05(), step=step, col=col, unit=unit, alt=alt, line=line, solid=solid);
ldraw_lib__2384p05(line=0.2);
